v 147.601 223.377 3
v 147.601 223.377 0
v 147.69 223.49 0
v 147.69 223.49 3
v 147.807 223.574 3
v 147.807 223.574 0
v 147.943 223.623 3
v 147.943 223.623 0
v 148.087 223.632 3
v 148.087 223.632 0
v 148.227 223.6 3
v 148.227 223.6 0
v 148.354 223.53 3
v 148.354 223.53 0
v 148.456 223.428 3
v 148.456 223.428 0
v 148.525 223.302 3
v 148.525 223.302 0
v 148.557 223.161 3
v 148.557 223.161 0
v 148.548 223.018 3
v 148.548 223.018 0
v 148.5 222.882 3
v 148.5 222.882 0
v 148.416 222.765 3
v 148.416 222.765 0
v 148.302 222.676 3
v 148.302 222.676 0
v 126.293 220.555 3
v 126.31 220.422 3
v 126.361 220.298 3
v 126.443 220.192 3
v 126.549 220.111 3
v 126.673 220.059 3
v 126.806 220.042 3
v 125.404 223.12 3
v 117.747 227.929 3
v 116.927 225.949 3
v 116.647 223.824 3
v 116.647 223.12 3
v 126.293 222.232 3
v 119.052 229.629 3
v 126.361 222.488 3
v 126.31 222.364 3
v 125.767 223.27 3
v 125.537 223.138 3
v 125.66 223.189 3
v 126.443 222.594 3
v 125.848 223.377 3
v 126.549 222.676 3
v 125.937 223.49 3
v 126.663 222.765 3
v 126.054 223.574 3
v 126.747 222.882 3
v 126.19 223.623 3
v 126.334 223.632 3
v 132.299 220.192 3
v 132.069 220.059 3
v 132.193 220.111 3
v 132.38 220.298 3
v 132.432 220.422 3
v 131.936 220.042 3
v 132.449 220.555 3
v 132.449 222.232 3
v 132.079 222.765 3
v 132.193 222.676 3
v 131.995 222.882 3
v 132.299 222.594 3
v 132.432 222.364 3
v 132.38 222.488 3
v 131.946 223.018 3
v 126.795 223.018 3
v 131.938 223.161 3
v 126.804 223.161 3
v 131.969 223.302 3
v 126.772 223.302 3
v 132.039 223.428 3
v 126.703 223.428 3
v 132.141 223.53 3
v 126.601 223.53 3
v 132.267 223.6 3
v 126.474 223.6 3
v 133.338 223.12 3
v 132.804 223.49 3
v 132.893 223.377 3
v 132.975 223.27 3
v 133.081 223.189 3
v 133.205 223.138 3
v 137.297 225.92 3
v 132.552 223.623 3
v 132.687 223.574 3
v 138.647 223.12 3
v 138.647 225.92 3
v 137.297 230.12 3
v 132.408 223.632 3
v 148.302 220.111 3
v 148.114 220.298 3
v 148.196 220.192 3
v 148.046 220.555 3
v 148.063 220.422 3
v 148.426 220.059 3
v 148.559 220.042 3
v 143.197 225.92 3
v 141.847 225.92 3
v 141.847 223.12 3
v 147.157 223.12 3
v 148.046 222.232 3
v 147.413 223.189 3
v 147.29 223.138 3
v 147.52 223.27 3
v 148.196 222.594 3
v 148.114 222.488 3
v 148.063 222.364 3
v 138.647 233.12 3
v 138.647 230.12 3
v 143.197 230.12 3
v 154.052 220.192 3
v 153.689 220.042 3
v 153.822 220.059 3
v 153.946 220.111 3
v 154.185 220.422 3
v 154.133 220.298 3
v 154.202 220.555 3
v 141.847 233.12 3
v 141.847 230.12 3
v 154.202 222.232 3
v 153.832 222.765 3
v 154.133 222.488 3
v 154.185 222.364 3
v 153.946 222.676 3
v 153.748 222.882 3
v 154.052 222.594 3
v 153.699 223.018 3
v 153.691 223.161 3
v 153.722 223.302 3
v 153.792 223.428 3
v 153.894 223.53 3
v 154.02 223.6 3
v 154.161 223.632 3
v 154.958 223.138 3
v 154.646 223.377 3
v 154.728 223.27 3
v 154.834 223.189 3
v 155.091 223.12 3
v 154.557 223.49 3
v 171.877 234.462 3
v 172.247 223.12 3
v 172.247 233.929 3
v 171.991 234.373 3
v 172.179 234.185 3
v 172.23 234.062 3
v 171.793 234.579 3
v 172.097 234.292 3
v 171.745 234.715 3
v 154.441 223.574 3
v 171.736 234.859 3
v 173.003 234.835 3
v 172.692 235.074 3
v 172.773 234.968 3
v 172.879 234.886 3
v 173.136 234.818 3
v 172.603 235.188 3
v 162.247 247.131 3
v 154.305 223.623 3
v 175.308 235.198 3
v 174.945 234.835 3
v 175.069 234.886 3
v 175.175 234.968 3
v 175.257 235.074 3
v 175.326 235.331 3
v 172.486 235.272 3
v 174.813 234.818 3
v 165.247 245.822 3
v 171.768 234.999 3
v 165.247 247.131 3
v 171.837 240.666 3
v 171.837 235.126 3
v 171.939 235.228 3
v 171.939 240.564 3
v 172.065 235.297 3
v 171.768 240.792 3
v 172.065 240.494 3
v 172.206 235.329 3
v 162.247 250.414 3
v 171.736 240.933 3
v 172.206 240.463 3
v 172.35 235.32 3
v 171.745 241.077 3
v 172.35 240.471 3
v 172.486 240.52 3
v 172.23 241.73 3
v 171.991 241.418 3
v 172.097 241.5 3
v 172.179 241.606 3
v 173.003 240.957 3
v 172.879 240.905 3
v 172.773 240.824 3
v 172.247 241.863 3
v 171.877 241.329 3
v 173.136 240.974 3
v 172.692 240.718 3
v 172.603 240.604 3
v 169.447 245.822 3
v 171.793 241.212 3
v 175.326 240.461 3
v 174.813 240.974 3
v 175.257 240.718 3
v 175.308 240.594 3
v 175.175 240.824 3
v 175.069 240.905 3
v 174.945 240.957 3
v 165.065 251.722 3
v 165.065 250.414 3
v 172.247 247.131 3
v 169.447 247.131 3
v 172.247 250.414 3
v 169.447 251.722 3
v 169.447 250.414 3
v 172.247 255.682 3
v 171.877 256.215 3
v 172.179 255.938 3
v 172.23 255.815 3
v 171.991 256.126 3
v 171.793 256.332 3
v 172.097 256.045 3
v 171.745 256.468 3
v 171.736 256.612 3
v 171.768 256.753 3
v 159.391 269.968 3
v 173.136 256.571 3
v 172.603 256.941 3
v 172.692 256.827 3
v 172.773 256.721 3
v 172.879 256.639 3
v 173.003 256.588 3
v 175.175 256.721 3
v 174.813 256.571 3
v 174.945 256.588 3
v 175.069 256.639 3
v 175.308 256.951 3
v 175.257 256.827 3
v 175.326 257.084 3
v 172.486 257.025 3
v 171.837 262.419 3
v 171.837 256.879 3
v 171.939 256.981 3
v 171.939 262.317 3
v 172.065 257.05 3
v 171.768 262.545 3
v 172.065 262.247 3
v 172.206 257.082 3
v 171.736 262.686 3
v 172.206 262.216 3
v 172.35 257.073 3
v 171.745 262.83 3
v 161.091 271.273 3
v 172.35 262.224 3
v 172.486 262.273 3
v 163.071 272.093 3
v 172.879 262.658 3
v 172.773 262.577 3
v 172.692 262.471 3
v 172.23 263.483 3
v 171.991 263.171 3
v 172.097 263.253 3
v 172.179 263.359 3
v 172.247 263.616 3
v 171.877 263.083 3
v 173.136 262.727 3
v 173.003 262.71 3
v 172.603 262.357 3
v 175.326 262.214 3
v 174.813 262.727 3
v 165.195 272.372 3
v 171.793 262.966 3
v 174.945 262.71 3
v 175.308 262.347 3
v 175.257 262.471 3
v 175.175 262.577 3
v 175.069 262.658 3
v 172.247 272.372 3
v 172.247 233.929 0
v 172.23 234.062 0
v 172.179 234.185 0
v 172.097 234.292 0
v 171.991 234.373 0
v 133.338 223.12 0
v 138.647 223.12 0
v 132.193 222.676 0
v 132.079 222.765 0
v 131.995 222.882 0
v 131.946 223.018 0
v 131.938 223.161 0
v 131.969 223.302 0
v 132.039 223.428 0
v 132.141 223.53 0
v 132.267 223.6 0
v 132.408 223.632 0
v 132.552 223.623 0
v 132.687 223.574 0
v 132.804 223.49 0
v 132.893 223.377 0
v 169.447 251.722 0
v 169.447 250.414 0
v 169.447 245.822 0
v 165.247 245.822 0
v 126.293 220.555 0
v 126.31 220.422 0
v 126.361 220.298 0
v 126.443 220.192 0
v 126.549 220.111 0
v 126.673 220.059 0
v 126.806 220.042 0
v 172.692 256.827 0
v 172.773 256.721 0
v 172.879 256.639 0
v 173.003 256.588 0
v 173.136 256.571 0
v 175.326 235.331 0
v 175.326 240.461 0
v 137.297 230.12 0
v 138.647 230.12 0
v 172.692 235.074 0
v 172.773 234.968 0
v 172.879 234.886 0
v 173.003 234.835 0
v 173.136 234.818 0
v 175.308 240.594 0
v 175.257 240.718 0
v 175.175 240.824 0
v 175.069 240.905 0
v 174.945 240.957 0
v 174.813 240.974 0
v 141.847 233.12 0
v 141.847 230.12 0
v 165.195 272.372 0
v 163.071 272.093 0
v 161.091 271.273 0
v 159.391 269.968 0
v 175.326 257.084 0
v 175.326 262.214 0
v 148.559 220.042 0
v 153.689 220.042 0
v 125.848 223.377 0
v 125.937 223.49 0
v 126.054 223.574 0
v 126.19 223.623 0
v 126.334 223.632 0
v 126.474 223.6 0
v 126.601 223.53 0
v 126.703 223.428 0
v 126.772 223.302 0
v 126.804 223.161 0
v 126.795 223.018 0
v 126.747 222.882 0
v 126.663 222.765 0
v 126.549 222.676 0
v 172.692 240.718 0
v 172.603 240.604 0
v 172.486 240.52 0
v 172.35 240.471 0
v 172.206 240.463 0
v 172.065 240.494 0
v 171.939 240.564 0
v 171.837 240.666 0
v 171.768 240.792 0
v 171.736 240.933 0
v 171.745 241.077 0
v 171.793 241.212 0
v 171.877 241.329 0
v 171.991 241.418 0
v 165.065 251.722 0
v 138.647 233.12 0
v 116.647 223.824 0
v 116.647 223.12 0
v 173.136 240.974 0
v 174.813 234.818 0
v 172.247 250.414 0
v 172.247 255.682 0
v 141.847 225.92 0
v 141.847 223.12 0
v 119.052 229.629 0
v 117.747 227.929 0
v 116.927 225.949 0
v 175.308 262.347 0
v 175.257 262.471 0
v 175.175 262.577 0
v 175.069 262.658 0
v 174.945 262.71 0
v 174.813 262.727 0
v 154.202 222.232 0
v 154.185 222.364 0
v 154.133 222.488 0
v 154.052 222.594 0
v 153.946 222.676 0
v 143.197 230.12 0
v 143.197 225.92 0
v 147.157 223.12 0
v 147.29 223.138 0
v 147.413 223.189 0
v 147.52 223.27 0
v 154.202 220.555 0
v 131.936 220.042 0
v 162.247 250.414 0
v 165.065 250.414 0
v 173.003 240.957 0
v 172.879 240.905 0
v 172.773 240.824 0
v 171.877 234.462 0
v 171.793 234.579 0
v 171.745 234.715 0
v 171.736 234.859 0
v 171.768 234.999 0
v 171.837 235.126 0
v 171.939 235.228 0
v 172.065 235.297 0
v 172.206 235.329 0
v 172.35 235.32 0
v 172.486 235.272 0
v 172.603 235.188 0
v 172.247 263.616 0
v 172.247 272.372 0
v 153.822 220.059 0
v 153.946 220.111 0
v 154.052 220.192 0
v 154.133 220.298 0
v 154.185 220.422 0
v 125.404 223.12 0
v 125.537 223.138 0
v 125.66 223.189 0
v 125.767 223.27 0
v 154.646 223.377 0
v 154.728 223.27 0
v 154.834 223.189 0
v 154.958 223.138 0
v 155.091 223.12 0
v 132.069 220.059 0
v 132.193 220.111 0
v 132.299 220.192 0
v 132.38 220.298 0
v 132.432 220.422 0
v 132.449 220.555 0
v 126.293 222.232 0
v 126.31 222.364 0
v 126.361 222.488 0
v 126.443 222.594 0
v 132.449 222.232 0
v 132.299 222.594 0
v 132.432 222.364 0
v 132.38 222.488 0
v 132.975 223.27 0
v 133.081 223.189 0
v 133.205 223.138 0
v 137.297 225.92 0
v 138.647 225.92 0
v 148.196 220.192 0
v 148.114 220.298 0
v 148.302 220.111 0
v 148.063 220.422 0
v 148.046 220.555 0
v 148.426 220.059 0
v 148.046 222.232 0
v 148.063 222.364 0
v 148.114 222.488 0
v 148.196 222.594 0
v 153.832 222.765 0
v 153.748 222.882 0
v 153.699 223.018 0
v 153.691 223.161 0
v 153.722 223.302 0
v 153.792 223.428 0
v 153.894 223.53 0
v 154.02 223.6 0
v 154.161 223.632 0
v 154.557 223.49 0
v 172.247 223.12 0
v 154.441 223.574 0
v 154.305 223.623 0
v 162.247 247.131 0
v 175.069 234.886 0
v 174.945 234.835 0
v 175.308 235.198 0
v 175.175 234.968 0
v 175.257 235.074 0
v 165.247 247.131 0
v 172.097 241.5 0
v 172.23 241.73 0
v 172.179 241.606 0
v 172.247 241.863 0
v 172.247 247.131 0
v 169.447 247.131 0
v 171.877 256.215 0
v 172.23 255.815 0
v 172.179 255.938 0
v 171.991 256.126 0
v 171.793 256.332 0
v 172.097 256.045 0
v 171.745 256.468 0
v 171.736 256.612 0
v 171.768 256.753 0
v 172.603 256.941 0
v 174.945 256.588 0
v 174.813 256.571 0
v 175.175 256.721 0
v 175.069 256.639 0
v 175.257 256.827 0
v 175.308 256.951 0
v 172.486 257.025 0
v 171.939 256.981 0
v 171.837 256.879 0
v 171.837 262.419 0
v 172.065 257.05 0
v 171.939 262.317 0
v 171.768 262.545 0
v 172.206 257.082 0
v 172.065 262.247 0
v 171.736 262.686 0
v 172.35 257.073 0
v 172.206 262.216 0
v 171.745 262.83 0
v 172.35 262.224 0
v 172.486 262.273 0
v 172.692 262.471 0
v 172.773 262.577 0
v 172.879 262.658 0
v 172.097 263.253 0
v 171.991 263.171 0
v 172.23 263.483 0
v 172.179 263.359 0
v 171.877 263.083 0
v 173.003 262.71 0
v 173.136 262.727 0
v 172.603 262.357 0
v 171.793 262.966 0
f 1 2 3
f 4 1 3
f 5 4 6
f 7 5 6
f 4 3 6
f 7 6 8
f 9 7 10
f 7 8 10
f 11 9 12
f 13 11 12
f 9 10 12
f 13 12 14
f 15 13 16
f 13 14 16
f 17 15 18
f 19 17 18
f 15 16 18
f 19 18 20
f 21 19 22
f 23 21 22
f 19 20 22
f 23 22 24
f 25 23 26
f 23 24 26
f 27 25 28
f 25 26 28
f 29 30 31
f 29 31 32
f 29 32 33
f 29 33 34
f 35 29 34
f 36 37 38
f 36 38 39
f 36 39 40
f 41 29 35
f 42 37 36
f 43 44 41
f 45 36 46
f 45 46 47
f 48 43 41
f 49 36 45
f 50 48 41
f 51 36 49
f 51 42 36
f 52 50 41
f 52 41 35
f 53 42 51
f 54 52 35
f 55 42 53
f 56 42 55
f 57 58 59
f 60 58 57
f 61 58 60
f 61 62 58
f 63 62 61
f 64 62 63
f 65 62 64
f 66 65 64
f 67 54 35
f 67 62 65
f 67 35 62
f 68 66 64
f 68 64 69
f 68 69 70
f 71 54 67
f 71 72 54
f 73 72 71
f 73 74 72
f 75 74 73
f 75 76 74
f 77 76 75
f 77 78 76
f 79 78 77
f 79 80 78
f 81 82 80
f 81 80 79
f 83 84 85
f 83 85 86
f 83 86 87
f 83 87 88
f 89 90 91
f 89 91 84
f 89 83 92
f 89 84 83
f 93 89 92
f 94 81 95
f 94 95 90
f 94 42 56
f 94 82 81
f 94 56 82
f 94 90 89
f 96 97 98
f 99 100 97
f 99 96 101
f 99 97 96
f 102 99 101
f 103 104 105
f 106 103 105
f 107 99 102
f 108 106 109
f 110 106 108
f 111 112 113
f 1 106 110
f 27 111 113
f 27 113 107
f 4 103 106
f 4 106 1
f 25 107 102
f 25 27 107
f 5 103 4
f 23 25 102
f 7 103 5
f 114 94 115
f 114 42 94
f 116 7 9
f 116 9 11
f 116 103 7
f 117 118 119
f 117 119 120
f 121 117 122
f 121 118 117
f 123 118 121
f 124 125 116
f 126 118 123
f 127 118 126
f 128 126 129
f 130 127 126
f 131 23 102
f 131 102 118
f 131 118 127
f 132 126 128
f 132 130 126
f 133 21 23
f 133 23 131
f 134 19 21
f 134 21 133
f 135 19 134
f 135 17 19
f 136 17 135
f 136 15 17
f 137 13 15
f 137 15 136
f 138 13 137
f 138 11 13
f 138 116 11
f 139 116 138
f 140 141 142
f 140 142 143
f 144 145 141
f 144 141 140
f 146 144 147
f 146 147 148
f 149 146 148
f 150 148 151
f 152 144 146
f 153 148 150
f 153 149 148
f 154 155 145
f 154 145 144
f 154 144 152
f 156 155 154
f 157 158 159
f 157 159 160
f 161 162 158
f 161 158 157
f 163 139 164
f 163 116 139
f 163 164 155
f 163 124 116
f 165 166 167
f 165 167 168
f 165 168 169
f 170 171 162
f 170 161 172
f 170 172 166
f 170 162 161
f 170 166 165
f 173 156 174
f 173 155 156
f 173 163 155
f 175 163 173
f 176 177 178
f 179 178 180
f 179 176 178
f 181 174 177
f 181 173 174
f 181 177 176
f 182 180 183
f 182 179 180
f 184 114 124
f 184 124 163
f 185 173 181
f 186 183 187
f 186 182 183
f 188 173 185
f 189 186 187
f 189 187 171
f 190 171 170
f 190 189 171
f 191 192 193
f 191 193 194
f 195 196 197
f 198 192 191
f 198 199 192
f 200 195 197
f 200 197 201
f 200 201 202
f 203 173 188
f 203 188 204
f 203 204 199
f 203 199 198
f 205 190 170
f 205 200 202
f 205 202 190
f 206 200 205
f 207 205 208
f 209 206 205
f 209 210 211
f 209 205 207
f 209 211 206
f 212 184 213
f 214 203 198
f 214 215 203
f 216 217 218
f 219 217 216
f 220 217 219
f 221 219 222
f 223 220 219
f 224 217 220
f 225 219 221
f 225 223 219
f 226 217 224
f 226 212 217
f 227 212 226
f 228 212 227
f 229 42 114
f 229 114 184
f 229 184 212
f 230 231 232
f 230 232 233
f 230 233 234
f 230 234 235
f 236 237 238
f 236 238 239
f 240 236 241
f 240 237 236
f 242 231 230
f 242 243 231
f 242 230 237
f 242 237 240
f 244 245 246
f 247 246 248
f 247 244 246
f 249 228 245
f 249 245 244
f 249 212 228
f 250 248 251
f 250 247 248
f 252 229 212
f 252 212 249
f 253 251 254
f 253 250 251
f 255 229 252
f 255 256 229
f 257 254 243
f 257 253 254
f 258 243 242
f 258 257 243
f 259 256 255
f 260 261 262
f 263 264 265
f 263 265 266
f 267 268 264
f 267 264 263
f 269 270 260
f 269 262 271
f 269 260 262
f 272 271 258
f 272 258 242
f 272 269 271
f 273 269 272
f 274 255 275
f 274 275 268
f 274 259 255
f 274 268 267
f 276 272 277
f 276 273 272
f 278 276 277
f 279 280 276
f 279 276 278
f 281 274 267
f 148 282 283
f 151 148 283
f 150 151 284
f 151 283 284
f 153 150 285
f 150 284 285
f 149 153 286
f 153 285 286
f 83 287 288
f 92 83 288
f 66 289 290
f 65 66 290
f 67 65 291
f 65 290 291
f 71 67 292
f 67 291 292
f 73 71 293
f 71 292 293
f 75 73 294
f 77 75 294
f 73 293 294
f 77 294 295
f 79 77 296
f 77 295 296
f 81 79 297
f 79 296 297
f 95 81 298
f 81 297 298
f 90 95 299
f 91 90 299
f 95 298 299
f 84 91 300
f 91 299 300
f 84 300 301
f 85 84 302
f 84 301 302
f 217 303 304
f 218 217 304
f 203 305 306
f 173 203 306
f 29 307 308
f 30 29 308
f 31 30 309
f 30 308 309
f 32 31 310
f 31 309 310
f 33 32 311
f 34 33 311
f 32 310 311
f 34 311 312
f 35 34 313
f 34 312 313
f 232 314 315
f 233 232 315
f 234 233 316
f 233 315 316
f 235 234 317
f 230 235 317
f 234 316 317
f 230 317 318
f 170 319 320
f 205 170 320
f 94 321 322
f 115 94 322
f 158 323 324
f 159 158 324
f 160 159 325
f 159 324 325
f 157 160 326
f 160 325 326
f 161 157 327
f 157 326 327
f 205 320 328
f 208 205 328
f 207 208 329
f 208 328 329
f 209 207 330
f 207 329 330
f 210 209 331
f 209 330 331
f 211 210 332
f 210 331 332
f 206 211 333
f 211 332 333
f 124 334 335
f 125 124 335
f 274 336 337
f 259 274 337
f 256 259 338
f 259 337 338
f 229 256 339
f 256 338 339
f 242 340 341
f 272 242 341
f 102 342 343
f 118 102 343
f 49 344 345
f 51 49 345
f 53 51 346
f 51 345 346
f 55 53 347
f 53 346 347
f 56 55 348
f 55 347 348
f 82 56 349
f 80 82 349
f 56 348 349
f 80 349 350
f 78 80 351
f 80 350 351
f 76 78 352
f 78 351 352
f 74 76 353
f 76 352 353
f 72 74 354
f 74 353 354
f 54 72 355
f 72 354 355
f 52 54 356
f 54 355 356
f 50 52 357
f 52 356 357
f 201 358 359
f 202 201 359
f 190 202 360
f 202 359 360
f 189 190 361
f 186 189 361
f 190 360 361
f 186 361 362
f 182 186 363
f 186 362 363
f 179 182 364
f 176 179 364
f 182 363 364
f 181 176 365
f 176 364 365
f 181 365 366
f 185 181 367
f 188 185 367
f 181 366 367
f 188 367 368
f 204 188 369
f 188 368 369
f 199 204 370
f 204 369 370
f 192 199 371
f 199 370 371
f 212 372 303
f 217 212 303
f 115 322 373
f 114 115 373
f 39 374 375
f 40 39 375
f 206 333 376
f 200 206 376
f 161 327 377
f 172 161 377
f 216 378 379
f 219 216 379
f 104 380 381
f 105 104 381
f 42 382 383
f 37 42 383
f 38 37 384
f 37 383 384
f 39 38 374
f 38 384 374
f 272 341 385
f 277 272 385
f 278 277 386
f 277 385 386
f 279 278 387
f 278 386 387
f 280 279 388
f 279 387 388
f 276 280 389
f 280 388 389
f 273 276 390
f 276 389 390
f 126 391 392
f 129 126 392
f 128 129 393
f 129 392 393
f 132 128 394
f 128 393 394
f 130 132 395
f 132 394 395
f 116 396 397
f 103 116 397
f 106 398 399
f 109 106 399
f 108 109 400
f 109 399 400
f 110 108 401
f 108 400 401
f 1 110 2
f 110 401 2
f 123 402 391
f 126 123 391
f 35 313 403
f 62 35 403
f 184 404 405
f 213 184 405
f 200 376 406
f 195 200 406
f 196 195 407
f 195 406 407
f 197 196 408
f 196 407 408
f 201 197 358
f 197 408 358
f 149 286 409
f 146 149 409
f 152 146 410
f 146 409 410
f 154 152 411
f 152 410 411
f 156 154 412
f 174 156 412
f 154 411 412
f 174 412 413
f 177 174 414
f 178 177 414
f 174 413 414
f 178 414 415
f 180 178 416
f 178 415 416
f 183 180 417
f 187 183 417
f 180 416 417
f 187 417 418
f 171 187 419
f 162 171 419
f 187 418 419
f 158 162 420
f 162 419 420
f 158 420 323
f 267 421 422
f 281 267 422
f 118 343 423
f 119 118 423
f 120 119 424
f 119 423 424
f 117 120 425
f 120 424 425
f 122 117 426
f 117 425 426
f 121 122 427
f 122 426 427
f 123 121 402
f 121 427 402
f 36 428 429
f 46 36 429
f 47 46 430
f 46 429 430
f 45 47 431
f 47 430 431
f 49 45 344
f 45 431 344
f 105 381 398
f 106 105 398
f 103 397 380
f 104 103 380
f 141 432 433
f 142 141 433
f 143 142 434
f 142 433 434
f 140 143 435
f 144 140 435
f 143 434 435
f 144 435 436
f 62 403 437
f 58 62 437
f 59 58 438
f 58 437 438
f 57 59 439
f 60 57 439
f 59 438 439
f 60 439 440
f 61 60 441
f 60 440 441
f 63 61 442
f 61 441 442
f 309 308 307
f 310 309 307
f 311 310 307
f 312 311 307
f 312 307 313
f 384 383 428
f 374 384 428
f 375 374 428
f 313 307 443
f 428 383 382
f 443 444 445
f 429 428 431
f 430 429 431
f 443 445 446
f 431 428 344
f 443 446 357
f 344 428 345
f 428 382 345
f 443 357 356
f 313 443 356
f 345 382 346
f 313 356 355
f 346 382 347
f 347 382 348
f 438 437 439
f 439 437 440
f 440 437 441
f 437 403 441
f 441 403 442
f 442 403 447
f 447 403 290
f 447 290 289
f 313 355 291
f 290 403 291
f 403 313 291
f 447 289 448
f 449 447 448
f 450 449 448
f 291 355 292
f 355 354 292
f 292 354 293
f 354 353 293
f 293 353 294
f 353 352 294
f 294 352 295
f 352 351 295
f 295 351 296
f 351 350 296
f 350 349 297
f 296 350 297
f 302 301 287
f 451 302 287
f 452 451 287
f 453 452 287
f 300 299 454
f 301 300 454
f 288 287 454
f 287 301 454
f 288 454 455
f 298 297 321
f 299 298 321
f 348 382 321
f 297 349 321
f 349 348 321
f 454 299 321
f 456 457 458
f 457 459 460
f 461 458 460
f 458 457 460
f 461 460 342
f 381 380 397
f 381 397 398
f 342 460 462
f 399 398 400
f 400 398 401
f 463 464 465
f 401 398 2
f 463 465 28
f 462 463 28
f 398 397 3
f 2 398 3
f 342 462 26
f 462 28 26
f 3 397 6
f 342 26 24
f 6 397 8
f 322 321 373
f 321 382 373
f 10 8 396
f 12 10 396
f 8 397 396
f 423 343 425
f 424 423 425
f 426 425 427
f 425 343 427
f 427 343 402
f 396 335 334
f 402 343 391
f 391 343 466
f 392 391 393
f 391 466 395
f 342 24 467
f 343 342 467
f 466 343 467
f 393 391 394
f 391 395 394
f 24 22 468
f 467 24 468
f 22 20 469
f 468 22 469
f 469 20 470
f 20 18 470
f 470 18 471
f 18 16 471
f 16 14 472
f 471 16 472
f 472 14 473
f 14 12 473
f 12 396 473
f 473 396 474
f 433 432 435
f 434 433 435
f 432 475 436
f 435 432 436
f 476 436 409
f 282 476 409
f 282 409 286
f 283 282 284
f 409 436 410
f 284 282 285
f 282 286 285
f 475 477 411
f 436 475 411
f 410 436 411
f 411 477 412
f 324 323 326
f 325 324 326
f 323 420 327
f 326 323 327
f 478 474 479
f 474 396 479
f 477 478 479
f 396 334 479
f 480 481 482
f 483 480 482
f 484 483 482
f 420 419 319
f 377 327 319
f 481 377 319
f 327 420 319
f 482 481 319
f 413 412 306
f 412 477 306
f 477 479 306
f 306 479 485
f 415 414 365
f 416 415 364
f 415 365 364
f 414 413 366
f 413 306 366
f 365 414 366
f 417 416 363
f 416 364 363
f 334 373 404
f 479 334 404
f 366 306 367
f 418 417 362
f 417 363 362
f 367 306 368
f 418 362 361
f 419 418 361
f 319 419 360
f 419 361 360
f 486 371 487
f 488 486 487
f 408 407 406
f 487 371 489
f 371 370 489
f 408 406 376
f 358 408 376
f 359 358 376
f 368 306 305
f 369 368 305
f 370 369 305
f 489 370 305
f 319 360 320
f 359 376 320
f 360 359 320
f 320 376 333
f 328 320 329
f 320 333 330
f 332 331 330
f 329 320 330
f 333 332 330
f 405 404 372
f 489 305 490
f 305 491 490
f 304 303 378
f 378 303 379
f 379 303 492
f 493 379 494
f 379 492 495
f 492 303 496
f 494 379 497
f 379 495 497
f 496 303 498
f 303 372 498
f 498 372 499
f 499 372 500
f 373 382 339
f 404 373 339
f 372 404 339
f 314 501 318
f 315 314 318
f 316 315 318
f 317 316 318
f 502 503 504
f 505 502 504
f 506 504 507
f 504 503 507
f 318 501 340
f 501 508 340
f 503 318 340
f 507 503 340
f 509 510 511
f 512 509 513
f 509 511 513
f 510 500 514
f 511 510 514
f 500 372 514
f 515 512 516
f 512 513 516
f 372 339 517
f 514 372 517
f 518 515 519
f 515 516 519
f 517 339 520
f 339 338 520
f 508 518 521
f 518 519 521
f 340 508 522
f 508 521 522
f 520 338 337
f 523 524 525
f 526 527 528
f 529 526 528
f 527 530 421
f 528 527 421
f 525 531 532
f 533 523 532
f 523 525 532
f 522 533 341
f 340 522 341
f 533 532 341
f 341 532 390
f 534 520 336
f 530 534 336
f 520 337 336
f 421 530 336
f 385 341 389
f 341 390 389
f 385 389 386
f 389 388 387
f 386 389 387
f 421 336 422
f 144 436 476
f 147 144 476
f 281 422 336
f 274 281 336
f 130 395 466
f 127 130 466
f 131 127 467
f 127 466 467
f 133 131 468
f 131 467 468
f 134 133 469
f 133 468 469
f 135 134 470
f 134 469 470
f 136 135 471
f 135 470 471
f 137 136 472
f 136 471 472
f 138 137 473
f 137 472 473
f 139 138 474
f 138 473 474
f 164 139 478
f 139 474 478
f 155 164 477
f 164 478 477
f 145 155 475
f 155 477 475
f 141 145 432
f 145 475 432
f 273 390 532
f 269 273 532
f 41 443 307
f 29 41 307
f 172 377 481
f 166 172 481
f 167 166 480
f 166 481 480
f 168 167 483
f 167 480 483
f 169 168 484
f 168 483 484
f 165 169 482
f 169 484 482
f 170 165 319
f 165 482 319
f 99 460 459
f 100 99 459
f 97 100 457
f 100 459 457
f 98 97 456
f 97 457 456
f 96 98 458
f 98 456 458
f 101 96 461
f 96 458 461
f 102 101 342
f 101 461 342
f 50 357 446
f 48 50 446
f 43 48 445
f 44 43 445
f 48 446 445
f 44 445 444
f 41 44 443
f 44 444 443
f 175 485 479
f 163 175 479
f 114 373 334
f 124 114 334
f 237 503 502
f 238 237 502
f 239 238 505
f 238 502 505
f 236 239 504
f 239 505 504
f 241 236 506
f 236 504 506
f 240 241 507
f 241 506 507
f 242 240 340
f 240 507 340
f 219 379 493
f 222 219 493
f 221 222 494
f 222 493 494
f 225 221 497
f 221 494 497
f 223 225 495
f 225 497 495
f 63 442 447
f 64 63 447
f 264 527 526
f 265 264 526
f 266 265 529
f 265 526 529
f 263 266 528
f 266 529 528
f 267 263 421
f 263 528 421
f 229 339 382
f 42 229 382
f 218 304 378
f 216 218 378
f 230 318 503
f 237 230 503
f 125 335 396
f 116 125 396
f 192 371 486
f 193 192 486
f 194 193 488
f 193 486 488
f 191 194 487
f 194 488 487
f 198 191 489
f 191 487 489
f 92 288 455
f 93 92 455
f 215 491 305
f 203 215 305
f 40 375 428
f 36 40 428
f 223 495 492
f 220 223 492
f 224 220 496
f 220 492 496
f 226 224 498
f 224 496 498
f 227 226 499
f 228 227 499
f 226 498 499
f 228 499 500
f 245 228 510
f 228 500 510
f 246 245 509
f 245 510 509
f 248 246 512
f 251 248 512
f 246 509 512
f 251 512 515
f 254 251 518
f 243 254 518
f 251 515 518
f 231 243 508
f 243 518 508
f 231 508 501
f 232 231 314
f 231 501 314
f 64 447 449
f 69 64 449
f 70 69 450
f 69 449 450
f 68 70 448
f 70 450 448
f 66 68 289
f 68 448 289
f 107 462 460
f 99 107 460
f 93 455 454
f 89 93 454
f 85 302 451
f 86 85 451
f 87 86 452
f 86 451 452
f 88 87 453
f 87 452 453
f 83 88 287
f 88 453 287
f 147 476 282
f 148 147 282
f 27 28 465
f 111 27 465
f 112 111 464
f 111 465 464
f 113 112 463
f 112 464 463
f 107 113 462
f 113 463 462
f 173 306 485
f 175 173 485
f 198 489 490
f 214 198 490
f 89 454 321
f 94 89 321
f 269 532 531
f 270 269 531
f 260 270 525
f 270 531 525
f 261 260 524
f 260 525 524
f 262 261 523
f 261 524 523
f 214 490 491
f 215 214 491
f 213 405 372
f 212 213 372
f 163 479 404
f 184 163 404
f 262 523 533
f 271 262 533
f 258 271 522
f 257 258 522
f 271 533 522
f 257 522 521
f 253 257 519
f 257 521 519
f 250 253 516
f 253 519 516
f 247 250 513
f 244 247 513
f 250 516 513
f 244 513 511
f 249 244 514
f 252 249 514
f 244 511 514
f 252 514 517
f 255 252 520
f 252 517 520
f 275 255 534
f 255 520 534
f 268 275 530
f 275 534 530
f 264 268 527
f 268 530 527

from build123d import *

# Parameters (mm, degrees)
BOSS_EXTRUDE1_DEPTH = 3


with BuildPart() as part:
    # Sketch1 → Boss-Extrude1 (new body)
    with BuildSketch(Plane.XY):
        with BuildLine():
            Line((154.202092406, 220.554881742), (154.202092406, 222.231534508))
            ThreePointArc((154.202092406, 222.231534508), (154.133358076, 222.488056371), (153.945571469, 222.675843656))
            ThreePointArc((153.945571469, 222.675843656), (153.839317887, 223.482927965), (154.646402272, 223.376674963))
            ThreePointArc((154.646402272, 223.376674963), (154.834188461, 223.188888947), (155.090708914, 223.120153964))
            Line((155.090708914, 223.120153964), (172.247320861, 223.120153964))
            Line((172.247320861, 223.120153964), (172.247320861, 233.928920262))
            ThreePointArc((172.247320861, 233.928920262), (172.178586068, 234.185442001), (171.990799121, 234.373228947))
            ThreePointArc((171.990799121, 234.373228947), (171.884544083, 235.180313064), (172.69162866, 235.074061519))
            ThreePointArc((172.69162866, 235.074061519), (172.879415632, 234.886275586), (173.135936791, 234.817541323))
            Line((173.135936791, 234.817541323), (174.812591608, 234.817541323))
            ThreePointArc((174.812591608, 234.817541323), (175.175368126, 234.96780829), (175.325635071, 235.330584817))
            Line((175.325635071, 235.330584817), (175.325635071, 240.461016521))
            ThreePointArc((175.325635071, 240.461016521), (175.175368781, 240.82379332), (174.812592535, 240.974060941))
            Line((174.812592535, 240.974060941), (173.135939769, 240.974060941))
            ThreePointArc((173.135939769, 240.974060941), (172.879418072, 240.905325991), (172.691631242, 240.717538929))
            ThreePointArc((172.691631242, 240.717538929), (171.88454719, 240.611283394), (171.990798239, 241.418368036))
            ThreePointArc((171.990798239, 241.418368036), (172.178584056, 241.606155124), (172.247318162, 241.862676325))
            Line((172.247318162, 241.862676325), (172.247318162, 247.130575977))
            Line((172.247318162, 247.130575977), (169.447318162, 247.130575977))
            Line((169.447318162, 247.130575977), (169.447318162, 245.822321264))
            Line((169.447318162, 245.822321264), (165.247318162, 245.822321264))
            Line((165.247318162, 245.822321264), (165.247318162, 247.130575977))
            Line((165.247318162, 247.130575977), (162.247318162, 247.130575977))
            Line((162.247318162, 247.130575977), (162.247318162, 250.414066551))
            Line((162.247318162, 250.414066551), (165.064709466, 250.414066551))
            Line((165.064709466, 250.414066551), (165.064709466, 251.722321264))
            Line((165.064709466, 251.722321264), (169.447318162, 251.722321264))
            Line((169.447318162, 251.722321264), (169.447318162, 250.414066551))
            Line((169.447318162, 250.414066551), (172.247318162, 250.414066551))
            Line((172.247318162, 250.414066551), (172.247318162, 255.681968256))
            ThreePointArc((172.247318162, 255.681968256), (172.178583369, 255.938489995), (171.990796423, 256.126276941))
            ThreePointArc((171.990796423, 256.126276941), (171.884540761, 256.933361837), (172.691625961, 256.827108487))
            ThreePointArc((172.691625961, 256.827108487), (172.879412934, 256.639322554), (173.135934092, 256.57058829))
            Line((173.135934092, 256.57058829), (174.81258891, 256.57058829))
            ThreePointArc((174.81258891, 256.57058829), (175.175365428, 256.720855257), (175.325632372, 257.083631785))
            Line((175.325632372, 257.083631785), (175.325632372, 262.214063489))
            ThreePointArc((175.325632372, 262.214063489), (175.175366082, 262.576840287), (174.812589836, 262.727107909))
            Line((174.812589836, 262.727107909), (173.135937071, 262.727107909))
            ThreePointArc((173.135937071, 262.727107909), (172.879415358, 262.658373018), (172.691628483, 262.470586))
            ThreePointArc((172.691628483, 262.470586), (171.884544407, 262.364330653), (171.990795644, 263.17141527))
            ThreePointArc((171.990795644, 263.17141527), (172.178581505, 263.359202315), (172.24731567, 263.6157235))
            Line((172.24731567, 263.6157235), (172.24731567, 272.372324682))
            Line((172.24731567, 272.372324682), (165.195283942, 272.372324682))
            ThreePointArc((165.195283942, 272.372324682), (162.053952222, 271.747474765), (159.390859837, 269.968053135))
            Line((159.390859837, 269.968053135), (119.051573553, 229.628769332))
            ThreePointArc((119.051573553, 229.628769332), (117.272153027, 226.965676711), (116.647304057, 223.824345228))
            Line((116.647304057, 223.824345228), (116.647304057, 223.120152431))
            Line((116.647304057, 223.120152431), (125.403905518, 223.120152431))
            ThreePointArc((125.403905518, 223.120152431), (125.660427257, 223.188887224), (125.848214203, 223.37667417))
            ThreePointArc((125.848214203, 223.37667417), (126.655299099, 223.482929832), (126.549045749, 222.675844632))
            ThreePointArc((126.549045749, 222.675844632), (126.361259816, 222.488057659), (126.292525553, 222.231536501))
            Line((126.292525553, 222.231536501), (126.292525553, 220.554881683))
            ThreePointArc((126.292525553, 220.554881683), (126.442792519, 220.192105166), (126.805569047, 220.041838221))
            Line((126.805569047, 220.041838221), (131.936000751, 220.041838221))
            ThreePointArc((131.936000751, 220.041838221), (132.298776762, 220.192104665), (132.449044229, 220.554880252))
            Line((132.449044229, 220.554880252), (132.449044229, 222.231533018))
            ThreePointArc((132.449044229, 222.231533018), (132.380309899, 222.488054881), (132.192523292, 222.675842166))
            ThreePointArc((132.192523292, 222.675842166), (132.08626971, 223.482926475), (132.893354095, 223.376673473))
            ThreePointArc((132.893354095, 223.376673473), (133.081140729, 223.188887201), (133.337661764, 223.120152474))
            Line((133.337661764, 223.120152474), (138.647308242, 223.120152474))
            Line((138.647308242, 223.120152474), (138.647308242, 225.920152474))
            Line((138.647308242, 225.920152474), (137.297308242, 225.920152474))
            Line((137.297308242, 225.920152474), (137.297308242, 230.120152474))
            Line((137.297308242, 230.120152474), (138.647308242, 230.120152474))
            Line((138.647308242, 230.120152474), (138.647308242, 233.120152474))
            Line((138.647308242, 233.120152474), (141.847308242, 233.120152474))
            Line((141.847308242, 233.120152474), (141.847308242, 230.120152474))
            Line((141.847308242, 230.120152474), (143.197308242, 230.120152474))
            Line((143.197308242, 230.120152474), (143.197308242, 225.920152474))
            Line((143.197308242, 225.920152474), (141.847308242, 225.920152474))
            Line((141.847308242, 225.920152474), (141.847308242, 223.120152474))
            Line((141.847308242, 223.120152474), (147.156952668, 223.120152474))
            ThreePointArc((147.156952668, 223.120152474), (147.413474407, 223.188887267), (147.601261354, 223.376674213))
            ThreePointArc((147.601261354, 223.376674213), (148.408346249, 223.482929875), (148.302092899, 222.675844675))
            ThreePointArc((148.302092899, 222.675844675), (148.114306966, 222.488057703), (148.045572703, 222.231536544))
            Line((148.045572703, 222.231536544), (148.045572703, 220.554881727))
            ThreePointArc((148.045572703, 220.554881727), (148.19583967, 220.192105209), (148.558616197, 220.041838264))
            Line((148.558616197, 220.041838264), (153.689048927, 220.041838264))
            ThreePointArc((153.689048927, 220.041838264), (154.05182545, 220.19210522), (154.202092406, 220.554881742))
        make_face()
    extrude(amount=BOSS_EXTRUDE1_DEPTH)


solid = part.part
